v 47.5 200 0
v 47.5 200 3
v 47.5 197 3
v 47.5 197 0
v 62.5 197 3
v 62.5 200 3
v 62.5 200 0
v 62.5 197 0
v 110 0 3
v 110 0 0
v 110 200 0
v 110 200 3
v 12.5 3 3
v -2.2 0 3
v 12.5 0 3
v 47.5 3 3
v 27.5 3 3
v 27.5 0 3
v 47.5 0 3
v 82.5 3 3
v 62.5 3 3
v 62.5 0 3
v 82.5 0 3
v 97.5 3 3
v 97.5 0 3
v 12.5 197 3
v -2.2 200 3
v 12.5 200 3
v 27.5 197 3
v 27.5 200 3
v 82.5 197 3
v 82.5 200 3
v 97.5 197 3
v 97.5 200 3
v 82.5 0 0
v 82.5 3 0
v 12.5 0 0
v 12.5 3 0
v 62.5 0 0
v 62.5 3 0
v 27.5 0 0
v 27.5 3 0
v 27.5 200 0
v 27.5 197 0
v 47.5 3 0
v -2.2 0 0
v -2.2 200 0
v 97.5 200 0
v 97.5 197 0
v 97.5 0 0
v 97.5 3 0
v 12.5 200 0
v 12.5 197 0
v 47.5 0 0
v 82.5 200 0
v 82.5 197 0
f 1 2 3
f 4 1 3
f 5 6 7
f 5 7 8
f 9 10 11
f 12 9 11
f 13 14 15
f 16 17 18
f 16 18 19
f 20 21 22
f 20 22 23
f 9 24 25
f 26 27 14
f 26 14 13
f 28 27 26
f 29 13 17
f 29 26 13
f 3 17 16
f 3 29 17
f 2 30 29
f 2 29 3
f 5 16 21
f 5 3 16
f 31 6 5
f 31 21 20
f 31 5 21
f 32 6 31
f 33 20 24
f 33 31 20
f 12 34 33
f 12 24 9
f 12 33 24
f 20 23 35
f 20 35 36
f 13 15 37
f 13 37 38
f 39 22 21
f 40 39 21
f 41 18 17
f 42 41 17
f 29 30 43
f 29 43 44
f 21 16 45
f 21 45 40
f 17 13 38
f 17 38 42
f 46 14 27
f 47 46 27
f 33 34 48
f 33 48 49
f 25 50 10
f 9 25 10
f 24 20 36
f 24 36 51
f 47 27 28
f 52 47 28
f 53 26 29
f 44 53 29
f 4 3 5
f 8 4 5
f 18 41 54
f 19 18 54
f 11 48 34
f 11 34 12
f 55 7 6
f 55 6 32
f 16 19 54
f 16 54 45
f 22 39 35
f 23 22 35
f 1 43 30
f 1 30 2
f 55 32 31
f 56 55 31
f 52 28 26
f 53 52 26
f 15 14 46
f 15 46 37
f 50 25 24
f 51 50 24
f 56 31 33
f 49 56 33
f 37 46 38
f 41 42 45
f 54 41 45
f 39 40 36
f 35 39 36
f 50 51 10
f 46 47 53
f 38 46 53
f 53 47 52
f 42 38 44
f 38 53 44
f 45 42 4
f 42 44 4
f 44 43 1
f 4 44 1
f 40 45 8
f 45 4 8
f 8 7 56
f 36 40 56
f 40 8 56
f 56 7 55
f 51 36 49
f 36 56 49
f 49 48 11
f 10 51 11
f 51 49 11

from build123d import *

# Parameters (mm, degrees)
SKETCH_1_W          = 110
SKETCH_1_H          = 200
EXTRUDE_1_DEPTH     = 3
SKETCH_2_W          = 15
SKETCH_2_H          = 3
CUT_EXTRUDE_1_DEPTH = 229.273958217
SKETCH_3_W          = 2.2
SKETCH_3_H          = 200
EXTRUDE_2_DEPTH     = 3


with BuildPart() as part:
    # 草图1 → 凸台-拉伸1 (new body)
    with BuildSketch(Plane.XY):
        with Locations((55, 100)):
            Rectangle(SKETCH_1_W, SKETCH_1_H)
    extrude(amount=EXTRUDE_1_DEPTH)

    # 草图2 → 切除-拉伸1 (cut, through all)
    with BuildSketch(Plane.XY.offset(3)):
        with Locations((55, 1.5)):
            Rectangle(SKETCH_2_W, SKETCH_2_H)
        with Locations((20, 1.5)):
            Rectangle(SKETCH_2_W, SKETCH_2_H)
        with Locations((90, 1.5)):
            Rectangle(SKETCH_2_W, SKETCH_2_H)
    cut_extrude_1 = extrude(amount=-CUT_EXTRUDE_1_DEPTH, mode=Mode.SUBTRACT)

    # 镜向1: 切除-拉伸1 across plane
    add(cut_extrude_1.mirror(Plane(origin=(0, 100, 0), x_dir=(0, 0, 1), z_dir=(0, -1, 0))), mode=Mode.SUBTRACT)

    # 草图3 → 凸台-拉伸2 (add)
    with BuildSketch(Plane.XY.offset(3)):
        with Locations((-1.1, 100)):
            Rectangle(SKETCH_3_W, SKETCH_3_H)
    extrude(amount=-EXTRUDE_2_DEPTH)


solid = part.part
